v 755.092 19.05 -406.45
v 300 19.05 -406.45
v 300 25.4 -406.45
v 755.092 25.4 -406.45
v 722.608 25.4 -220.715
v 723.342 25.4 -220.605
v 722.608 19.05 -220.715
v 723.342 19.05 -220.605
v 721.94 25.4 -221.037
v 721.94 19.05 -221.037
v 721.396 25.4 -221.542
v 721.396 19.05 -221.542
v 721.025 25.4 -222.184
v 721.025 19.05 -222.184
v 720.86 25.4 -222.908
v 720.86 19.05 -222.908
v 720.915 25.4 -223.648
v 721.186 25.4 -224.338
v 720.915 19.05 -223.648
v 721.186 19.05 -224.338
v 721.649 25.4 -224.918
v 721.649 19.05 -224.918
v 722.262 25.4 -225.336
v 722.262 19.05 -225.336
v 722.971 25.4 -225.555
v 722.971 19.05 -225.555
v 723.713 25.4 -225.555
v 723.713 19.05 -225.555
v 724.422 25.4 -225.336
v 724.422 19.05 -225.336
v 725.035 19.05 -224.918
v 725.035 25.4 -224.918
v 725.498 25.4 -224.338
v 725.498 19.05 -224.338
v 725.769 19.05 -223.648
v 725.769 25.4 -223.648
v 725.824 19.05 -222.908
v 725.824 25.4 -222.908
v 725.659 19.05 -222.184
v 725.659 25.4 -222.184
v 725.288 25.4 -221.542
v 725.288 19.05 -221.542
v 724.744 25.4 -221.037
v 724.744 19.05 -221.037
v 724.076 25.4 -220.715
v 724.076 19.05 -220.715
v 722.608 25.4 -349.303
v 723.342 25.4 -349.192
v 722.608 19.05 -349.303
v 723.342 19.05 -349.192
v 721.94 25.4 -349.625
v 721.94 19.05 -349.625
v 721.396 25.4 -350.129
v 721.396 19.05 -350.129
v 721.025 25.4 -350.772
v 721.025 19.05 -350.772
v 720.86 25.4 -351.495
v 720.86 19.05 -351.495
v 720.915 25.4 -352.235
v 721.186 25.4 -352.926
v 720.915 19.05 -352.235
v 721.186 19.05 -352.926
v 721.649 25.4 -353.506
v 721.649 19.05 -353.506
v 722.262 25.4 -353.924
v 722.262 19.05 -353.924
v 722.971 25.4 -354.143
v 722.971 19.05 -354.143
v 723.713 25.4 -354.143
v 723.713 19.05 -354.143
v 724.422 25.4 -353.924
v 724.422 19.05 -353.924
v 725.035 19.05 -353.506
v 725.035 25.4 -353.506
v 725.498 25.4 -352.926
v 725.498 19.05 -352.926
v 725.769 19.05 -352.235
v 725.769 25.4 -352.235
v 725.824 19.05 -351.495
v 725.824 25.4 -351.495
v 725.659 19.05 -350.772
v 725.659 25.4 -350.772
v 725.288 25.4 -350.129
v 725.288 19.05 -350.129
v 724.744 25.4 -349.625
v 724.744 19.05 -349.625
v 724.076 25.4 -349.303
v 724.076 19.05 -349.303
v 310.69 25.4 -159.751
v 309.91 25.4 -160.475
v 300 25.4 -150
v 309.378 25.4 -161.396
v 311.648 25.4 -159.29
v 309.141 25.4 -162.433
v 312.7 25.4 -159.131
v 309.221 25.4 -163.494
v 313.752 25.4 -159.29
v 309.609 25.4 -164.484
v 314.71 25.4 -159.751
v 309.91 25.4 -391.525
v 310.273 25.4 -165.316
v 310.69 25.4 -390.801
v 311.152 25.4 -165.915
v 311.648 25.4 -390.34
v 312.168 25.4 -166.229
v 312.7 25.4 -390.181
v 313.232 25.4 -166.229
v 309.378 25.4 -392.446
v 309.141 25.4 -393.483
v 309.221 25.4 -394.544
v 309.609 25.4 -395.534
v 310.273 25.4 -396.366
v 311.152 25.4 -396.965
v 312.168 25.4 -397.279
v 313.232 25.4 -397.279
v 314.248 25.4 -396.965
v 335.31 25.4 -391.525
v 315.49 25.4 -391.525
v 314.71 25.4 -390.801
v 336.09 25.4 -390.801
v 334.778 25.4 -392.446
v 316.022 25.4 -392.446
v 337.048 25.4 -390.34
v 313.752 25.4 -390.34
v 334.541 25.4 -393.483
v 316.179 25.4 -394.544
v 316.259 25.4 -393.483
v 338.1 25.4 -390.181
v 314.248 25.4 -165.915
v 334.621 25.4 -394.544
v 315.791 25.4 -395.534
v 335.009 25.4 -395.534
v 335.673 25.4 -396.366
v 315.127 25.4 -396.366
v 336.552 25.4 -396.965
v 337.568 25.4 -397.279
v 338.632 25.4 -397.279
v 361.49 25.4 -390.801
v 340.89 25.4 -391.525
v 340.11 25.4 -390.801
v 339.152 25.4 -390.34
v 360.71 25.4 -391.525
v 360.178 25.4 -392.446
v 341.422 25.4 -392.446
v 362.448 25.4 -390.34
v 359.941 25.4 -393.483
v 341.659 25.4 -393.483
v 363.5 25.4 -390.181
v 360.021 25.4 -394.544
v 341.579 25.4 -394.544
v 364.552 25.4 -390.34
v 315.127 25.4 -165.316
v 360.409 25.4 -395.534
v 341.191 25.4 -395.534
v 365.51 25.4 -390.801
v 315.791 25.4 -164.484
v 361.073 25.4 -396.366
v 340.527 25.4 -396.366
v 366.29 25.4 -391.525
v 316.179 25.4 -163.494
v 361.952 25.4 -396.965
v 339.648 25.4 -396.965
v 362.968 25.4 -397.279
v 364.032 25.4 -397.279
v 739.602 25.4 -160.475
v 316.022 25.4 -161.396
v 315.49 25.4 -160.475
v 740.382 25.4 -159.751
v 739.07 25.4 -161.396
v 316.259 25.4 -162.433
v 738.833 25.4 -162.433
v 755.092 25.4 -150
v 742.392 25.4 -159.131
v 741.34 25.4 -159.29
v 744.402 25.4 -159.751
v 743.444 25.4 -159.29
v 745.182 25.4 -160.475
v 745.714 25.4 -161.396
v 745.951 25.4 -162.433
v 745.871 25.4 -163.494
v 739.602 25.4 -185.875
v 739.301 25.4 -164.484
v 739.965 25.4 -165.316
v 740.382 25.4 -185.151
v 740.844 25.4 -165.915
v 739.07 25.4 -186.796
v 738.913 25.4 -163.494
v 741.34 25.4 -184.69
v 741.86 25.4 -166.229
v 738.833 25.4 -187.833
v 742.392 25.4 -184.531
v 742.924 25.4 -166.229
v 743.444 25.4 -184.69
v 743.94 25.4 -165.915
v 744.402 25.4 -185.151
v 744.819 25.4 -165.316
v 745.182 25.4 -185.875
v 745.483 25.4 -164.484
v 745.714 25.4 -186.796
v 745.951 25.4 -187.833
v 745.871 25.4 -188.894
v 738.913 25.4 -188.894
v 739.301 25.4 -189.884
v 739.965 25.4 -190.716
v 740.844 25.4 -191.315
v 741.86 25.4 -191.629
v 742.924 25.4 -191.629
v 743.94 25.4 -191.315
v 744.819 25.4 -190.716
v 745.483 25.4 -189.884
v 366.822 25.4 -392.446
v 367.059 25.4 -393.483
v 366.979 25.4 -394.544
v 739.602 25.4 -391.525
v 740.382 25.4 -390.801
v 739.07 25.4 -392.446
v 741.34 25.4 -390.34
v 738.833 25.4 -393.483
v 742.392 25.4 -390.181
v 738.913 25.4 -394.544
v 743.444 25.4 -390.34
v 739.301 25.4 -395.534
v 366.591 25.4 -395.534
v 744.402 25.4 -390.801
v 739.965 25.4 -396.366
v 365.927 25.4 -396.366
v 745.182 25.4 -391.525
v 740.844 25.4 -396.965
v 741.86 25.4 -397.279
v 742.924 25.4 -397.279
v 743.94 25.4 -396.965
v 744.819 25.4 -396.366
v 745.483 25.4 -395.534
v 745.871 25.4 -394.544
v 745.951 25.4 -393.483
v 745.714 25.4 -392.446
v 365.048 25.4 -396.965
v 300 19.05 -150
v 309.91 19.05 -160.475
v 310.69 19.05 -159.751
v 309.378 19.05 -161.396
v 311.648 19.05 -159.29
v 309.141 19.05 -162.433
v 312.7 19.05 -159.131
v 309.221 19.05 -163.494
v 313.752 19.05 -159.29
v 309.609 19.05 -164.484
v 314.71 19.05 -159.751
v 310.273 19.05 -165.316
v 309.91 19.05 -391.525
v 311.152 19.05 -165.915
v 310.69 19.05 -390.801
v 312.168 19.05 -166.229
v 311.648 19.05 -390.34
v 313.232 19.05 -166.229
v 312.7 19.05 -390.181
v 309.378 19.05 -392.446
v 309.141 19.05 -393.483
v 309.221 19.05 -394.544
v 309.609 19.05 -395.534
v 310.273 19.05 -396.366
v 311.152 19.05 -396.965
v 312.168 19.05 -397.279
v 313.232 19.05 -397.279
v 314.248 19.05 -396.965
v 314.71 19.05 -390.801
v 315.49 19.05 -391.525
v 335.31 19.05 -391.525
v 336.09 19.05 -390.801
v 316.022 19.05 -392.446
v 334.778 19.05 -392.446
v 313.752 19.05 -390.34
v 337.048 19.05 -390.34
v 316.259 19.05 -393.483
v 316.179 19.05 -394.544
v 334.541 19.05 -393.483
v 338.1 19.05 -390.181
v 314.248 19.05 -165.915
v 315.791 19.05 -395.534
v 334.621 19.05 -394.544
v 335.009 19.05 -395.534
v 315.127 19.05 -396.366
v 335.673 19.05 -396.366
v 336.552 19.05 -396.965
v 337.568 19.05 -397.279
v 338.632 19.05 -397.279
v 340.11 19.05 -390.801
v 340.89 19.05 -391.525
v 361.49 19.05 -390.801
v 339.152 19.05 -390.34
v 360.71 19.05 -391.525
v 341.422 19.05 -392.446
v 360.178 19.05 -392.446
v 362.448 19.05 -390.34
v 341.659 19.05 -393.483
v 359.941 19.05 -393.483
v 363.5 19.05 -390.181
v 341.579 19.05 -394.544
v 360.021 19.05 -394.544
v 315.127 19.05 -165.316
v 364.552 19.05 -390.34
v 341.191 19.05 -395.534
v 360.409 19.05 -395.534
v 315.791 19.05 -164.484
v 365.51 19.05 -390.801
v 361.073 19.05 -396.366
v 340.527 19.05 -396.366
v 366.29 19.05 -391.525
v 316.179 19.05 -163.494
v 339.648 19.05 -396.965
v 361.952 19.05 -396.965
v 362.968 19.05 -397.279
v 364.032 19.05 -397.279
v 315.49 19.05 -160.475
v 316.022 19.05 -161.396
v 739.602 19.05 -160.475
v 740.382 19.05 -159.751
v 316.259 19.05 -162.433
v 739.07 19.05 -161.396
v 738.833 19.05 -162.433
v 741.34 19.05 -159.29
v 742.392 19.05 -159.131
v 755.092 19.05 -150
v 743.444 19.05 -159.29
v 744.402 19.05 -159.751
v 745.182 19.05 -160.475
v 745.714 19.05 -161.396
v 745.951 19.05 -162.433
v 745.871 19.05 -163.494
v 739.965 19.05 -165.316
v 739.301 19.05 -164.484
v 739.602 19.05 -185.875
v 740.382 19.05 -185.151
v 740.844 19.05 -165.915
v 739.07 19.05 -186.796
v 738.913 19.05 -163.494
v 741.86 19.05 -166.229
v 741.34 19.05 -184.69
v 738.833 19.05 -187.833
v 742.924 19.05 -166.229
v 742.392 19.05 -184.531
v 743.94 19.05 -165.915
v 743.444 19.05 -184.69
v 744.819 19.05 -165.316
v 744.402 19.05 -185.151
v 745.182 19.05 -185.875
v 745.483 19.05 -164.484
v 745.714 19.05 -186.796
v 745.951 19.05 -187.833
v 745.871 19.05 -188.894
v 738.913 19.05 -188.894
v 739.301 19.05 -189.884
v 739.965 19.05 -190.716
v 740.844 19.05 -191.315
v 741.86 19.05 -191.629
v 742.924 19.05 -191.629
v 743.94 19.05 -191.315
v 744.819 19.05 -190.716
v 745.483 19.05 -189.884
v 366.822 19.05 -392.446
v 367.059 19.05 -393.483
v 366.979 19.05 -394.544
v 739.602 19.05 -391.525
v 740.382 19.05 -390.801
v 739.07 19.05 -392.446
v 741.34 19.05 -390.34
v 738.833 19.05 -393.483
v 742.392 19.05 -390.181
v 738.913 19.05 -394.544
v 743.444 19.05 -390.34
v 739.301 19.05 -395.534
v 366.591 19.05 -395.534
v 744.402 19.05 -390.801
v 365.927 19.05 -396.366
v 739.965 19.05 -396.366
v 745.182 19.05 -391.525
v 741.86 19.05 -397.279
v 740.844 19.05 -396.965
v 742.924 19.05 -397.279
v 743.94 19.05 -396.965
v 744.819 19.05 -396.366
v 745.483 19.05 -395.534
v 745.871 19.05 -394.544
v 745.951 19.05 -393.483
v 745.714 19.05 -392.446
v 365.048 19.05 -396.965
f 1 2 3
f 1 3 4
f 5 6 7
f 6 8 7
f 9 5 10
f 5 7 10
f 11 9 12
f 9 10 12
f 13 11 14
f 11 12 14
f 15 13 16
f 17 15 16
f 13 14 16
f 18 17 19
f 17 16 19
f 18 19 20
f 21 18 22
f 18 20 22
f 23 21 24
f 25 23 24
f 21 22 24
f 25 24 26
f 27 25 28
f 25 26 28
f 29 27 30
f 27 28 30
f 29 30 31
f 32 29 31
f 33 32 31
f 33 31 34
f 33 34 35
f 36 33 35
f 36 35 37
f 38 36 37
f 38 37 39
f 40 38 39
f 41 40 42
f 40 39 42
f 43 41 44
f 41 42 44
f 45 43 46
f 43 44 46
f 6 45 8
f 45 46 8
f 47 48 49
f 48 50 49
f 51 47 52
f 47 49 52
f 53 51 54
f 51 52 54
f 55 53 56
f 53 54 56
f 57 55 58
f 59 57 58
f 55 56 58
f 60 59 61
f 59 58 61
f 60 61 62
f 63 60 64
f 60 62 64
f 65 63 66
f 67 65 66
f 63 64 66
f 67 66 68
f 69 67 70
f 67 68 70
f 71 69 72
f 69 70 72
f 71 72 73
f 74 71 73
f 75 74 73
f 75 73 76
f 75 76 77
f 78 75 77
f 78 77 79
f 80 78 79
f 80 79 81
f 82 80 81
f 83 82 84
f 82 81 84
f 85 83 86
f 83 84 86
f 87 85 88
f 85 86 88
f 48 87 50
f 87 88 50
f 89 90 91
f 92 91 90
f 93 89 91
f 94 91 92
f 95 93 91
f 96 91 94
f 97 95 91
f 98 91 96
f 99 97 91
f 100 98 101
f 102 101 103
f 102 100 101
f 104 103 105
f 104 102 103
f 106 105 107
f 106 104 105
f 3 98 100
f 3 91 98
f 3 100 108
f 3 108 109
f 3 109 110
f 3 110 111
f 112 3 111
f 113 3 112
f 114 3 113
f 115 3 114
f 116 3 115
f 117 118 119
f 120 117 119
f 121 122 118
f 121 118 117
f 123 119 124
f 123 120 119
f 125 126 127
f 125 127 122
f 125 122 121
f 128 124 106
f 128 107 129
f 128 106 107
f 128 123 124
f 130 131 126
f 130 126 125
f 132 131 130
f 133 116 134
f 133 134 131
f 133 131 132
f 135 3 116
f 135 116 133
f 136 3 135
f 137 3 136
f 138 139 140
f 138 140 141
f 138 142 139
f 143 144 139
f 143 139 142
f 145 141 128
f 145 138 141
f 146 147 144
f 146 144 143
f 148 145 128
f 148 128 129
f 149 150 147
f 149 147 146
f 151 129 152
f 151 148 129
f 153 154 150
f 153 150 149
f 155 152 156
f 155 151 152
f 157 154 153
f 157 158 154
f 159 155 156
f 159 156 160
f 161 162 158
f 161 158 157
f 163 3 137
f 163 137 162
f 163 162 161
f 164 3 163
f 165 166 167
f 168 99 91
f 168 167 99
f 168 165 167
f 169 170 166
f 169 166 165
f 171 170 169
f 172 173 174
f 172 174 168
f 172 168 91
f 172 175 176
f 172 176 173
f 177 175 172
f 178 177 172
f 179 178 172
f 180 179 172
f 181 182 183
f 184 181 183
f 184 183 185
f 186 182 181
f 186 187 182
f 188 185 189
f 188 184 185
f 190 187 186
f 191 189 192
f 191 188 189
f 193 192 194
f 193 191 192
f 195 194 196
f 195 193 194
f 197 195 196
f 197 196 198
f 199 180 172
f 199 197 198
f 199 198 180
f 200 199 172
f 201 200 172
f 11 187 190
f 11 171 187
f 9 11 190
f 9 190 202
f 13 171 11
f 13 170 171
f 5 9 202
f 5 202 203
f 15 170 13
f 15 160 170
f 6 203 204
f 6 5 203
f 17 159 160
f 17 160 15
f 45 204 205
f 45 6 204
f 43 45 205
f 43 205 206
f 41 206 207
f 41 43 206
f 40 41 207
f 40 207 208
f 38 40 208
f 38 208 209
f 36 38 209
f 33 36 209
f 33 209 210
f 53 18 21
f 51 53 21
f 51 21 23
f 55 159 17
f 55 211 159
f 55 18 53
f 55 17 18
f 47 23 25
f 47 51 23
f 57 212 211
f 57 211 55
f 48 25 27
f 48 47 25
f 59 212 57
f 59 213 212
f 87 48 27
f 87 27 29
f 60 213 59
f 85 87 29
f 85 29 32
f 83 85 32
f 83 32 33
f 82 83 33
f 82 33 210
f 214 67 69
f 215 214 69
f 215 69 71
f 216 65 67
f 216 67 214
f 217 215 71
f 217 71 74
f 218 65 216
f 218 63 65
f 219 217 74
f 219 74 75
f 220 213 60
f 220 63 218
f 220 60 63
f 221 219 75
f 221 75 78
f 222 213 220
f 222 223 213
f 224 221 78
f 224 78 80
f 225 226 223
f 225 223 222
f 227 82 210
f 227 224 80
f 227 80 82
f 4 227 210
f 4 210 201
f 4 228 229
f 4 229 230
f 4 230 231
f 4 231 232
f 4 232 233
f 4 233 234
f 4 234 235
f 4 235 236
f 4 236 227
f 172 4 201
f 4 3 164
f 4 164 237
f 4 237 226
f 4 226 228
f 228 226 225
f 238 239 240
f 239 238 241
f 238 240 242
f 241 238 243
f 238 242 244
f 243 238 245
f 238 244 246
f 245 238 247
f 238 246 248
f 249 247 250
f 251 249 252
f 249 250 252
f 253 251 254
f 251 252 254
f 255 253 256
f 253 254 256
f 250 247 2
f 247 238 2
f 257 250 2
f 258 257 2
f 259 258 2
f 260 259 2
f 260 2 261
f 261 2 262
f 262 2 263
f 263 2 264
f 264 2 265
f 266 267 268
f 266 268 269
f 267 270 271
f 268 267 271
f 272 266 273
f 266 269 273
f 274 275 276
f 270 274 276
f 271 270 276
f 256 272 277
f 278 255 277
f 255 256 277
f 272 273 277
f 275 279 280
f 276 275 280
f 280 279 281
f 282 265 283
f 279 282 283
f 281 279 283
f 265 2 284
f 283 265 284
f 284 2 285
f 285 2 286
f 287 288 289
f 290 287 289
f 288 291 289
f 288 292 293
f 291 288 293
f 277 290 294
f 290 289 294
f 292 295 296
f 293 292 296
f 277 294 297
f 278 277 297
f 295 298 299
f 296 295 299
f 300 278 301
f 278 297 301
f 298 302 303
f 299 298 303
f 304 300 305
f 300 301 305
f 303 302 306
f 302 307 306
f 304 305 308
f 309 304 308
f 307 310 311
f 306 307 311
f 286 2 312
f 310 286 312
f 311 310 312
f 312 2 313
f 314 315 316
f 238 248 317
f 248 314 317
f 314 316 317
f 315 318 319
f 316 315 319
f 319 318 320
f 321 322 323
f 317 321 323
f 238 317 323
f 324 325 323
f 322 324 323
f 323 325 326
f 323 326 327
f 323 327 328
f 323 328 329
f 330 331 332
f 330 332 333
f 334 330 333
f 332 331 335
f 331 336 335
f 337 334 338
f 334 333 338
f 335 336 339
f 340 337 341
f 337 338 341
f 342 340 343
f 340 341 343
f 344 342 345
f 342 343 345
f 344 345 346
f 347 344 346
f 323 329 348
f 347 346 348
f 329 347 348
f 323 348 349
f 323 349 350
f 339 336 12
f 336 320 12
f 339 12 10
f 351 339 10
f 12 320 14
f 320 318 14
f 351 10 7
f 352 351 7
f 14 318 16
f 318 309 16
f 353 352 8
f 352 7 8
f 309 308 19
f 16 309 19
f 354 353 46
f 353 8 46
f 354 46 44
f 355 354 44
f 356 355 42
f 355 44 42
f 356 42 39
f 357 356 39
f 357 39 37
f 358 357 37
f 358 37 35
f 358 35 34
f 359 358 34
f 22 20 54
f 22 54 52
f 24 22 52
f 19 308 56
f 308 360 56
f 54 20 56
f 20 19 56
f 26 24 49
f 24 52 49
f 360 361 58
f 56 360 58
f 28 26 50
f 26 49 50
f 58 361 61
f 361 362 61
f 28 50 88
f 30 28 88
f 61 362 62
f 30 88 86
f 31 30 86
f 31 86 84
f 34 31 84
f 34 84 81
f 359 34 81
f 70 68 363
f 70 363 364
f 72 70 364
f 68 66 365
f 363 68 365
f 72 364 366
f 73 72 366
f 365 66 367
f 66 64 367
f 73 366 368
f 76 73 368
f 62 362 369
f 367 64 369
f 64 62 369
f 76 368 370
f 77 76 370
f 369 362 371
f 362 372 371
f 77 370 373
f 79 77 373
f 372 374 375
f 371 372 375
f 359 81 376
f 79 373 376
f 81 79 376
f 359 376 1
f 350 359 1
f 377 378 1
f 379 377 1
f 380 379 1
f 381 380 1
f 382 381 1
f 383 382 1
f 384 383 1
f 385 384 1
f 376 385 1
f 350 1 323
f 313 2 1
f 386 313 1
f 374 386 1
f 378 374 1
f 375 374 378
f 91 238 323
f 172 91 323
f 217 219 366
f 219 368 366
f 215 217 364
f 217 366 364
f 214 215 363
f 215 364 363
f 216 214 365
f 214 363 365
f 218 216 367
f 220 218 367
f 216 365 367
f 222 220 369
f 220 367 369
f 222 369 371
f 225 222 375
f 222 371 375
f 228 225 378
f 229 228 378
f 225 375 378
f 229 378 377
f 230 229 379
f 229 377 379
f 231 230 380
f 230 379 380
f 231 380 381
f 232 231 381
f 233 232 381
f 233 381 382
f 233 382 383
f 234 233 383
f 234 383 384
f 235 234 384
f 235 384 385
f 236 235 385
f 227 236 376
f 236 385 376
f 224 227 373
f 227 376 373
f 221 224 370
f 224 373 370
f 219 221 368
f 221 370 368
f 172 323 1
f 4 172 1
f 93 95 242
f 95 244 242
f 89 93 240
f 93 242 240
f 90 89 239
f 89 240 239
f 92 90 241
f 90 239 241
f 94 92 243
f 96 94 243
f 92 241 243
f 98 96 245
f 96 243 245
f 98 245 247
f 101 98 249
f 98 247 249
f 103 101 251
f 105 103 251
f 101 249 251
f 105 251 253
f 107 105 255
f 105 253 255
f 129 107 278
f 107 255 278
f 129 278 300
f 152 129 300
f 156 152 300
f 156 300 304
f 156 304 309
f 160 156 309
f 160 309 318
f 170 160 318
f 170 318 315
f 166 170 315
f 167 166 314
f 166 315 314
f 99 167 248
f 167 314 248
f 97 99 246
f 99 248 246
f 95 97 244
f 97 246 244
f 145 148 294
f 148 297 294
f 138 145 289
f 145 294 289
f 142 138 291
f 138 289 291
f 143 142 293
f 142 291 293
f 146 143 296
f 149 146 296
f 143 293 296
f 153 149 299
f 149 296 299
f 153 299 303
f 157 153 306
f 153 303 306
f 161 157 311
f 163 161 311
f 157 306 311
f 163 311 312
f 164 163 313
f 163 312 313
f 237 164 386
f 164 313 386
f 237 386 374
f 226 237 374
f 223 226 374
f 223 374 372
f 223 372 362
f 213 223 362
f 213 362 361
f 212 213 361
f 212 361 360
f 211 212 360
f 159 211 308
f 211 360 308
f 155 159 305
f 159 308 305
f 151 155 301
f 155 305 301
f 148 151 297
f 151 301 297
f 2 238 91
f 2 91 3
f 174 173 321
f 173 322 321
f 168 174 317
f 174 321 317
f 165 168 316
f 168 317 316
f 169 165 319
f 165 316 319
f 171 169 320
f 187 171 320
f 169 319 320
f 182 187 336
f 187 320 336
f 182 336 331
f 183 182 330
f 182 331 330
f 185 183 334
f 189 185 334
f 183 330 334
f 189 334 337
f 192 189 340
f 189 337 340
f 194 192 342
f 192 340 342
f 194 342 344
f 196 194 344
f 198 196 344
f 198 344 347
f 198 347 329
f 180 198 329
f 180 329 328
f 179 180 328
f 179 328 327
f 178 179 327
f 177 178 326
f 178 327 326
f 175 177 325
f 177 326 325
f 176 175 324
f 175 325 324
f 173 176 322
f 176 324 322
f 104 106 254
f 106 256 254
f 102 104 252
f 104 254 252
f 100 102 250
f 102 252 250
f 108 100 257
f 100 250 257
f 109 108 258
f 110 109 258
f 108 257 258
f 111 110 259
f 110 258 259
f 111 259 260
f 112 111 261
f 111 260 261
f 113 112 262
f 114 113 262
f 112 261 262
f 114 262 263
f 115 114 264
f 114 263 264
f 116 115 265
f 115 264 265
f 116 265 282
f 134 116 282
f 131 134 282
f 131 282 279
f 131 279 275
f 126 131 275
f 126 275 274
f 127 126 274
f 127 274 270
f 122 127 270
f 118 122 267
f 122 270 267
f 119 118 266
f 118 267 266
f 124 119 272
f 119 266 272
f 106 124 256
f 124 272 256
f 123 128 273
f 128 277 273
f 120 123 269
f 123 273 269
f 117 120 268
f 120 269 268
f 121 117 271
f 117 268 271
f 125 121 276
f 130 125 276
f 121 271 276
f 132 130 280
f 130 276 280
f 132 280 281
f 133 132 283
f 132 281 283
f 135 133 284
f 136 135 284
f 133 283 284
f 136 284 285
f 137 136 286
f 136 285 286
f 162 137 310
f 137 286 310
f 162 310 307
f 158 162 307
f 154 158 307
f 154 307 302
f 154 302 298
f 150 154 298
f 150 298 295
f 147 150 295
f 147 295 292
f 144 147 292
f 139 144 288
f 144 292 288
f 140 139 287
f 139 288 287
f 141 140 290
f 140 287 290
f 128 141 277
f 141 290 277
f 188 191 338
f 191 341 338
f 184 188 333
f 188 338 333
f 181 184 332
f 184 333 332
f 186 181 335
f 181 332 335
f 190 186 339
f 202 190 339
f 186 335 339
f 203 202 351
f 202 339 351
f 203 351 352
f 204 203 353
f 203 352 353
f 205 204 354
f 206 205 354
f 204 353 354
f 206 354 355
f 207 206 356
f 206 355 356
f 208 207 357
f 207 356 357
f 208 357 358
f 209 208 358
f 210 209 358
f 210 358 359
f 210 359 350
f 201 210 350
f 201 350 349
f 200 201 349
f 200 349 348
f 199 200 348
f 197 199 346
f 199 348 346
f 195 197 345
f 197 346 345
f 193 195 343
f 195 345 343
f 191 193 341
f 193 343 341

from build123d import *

# Parameters (mm, degrees)
BOSS_EXTRUDE1_START              = 19.05
SKETCH2_W                        = 600
SKETCH2_H                        = 256.45
BOSS_EXTRUDE1_DEPTH              = 6.35
BOSS_EXTRUDE2_START              = 19.05
SKETCH2_4_W                      = 455.092
SKETCH2_4_H                      = 256.45
BOSS_EXTRUDE2_DEPTH              = 6.35
BOSS_EXTRUDE3_START              = 19.05
SKETCH2_5_W                      = 455.092
SKETCH2_5_H                      = 300
BOSS_EXTRUDE3_DEPTH              = 6.35
SKETCH8_W                        = 3.5687
SKETCH8_H                        = 6.35
F_1_4_CLEARANCE_HOLE2_AT_2_COUNT = 2
F_1_4_CLEARANCE_HOLE2_AT_2_PITCH = 231.05
F_1_4_CLEARANCE_HOLE2_AT_3_COUNT = 2
F_1_4_CLEARANCE_HOLE2_AT_3_PITCH = 595.822744195
F_1_4_CLEARANCE_HOLE2_AT_4_COUNT = 2
F_1_4_CLEARANCE_HOLE2_AT_4_PITCH = 619.31354135
F_1_4_CLEARANCE_HOLE2_AT_5_COUNT = 2
F_1_4_CLEARANCE_HOLE2_AT_5_PITCH = 523.8
F_1_4_CLEARANCE_HOLE2_AT_6_COUNT = 2
F_1_4_CLEARANCE_HOLE2_AT_6_PITCH = 549.2
F_1_4_CLEARANCE_HOLE2_AT_7_COUNT = 2
F_1_4_CLEARANCE_HOLE2_AT_7_PITCH = 574.6
SKETCH10_W                       = 3.5687
SKETCH10_H                       = 6.35
F_1_4_CLEARANCE_HOLE3_AT_2_COUNT = 2
F_1_4_CLEARANCE_HOLE3_AT_2_PITCH = 25.4
F_1_4_CLEARANCE_HOLE3_AT_3_COUNT = 2
F_1_4_CLEARANCE_HOLE3_AT_3_PITCH = 50.8
F_1_4_CLEARANCE_HOLE3_AT_4_COUNT = 2
F_1_4_CLEARANCE_HOLE3_AT_4_PITCH = 231.05
F_1_4_CLEARANCE_HOLE3_AT_5_COUNT = 2
F_1_4_CLEARANCE_HOLE3_AT_5_PITCH = 487.872234672
F_1_4_CLEARANCE_HOLE3_AT_6_COUNT = 2
F_1_4_CLEARANCE_HOLE3_AT_6_PITCH = 476.368698976
F_1_4_CLEARANCE_HOLE3_AT_7_COUNT = 2
F_1_4_CLEARANCE_HOLE3_AT_7_PITCH = 429.692
SKETCH12_W                       = 3.5687
SKETCH12_H                       = 6.35
F_1_4_CLEARANCE_HOLE4_AT_2_COUNT = 2
F_1_4_CLEARANCE_HOLE4_AT_2_PITCH = 25.4
F_1_4_CLEARANCE_HOLE4_AT_3_COUNT = 2
F_1_4_CLEARANCE_HOLE4_AT_3_PITCH = 249.2
F_1_4_CLEARANCE_HOLE4_AT_4_COUNT = 2
F_1_4_CLEARANCE_HOLE4_AT_4_PITCH = 496.725130091
F_1_4_CLEARANCE_HOLE4_AT_5_COUNT = 2
F_1_4_CLEARANCE_HOLE4_AT_5_PITCH = 429.692
F_1_4_CLEARANCE_HOLE4_AT_6_COUNT = 2
F_1_4_CLEARANCE_HOLE4_AT_6_PITCH = 430.442069115
SKETCH14_W                       = 2.4892
SKETCH14_H                       = 6.35
F_8_CLEARANCE_HOLE2_AT_2_COUNT   = 2
F_8_CLEARANCE_HOLE2_AT_2_PITCH   = 128.5875
SKETCH16_W                       = 2.4892
SKETCH16_H                       = 6.35
F_8_CLEARANCE_HOLE3_AT_2_COUNT   = 2
F_8_CLEARANCE_HOLE3_AT_2_PITCH   = 128.5875
SKETCH17_R                       = 3.5687
BOSS_EXTRUDE4_DEPTH              = 6.35
FILLET2_R                        = 6.35
SKETCH18_W                       = 152.4
SKETCH18_H                       = 25.4
SKETCH18_R                       = 3.5687
BOSS_EXTRUDE5_DEPTH              = 6.35
SKETCH19_W                       = 25.4
SKETCH19_H                       = 101.6
SKETCH19_R                       = 3.5687
BOSS_EXTRUDE6_DEPTH              = 6.35


with BuildPart() as part:
    # Sketch2 → Boss-Extrude1 (new body)
    with BuildSketch(Plane(origin=(0, 0, 0), x_dir=(1, 0, 0), z_dir=(0, 1, 0)).offset(BOSS_EXTRUDE1_START)):
        with Locations((0, 278.225)):
            Rectangle(SKETCH2_W, SKETCH2_H)
    extrude(amount=BOSS_EXTRUDE1_DEPTH)

    # Sketch8 → 1/4 Clearance Hole2 (revolve, cut)
    with BuildSketch(Plane(origin=(-287.3, 25.4, -393.75), x_dir=(0, 0, 1), z_dir=(1, 0, 0))):
        with Locations((1.78435, 3.175)):
            Rectangle(SKETCH8_W, SKETCH8_H)
    f_1_4_clearance_hole2 = revolve(axis=Axis((-287.3, 31.75, -393.75), (0, -1, 0)), mode=Mode.SUBTRACT)

    # 1/4 Clearance Hole2 at 2: 1/4 Clearance Hole2 ×2
    with Locations(*[(0, 0, i * F_1_4_CLEARANCE_HOLE2_AT_2_PITCH) for i in range(1, F_1_4_CLEARANCE_HOLE2_AT_2_COUNT)]):
        add(f_1_4_clearance_hole2, mode=Mode.SUBTRACT)

    # 1/4 Clearance Hole2 at 3: 1/4 Clearance Hole2 ×2
    with Locations(*[Vector(0.9217506470687957, 0, 0.3877831154501913) * (i * F_1_4_CLEARANCE_HOLE2_AT_3_PITCH) for i in range(1, F_1_4_CLEARANCE_HOLE2_AT_3_COUNT)]):
        add(f_1_4_clearance_hole2, mode=Mode.SUBTRACT)

    # 1/4 Clearance Hole2 at 4: 1/4 Clearance Hole2 ×2
    with Locations(*[Vector(0.9278014473041833, 0, 0.37307435502894426) * (i * F_1_4_CLEARANCE_HOLE2_AT_4_PITCH) for i in range(1, F_1_4_CLEARANCE_HOLE2_AT_4_COUNT)]):
        add(f_1_4_clearance_hole2, mode=Mode.SUBTRACT)

    # 1/4 Clearance Hole2 at 5: 1/4 Clearance Hole2 ×2
    with Locations(*[(i * F_1_4_CLEARANCE_HOLE2_AT_5_PITCH, 0, 0) for i in range(1, F_1_4_CLEARANCE_HOLE2_AT_5_COUNT)]):
        add(f_1_4_clearance_hole2, mode=Mode.SUBTRACT)

    # 1/4 Clearance Hole2 at 6: 1/4 Clearance Hole2 ×2
    with Locations(*[(i * F_1_4_CLEARANCE_HOLE2_AT_6_PITCH, 0, 0) for i in range(1, F_1_4_CLEARANCE_HOLE2_AT_6_COUNT)]):
        add(f_1_4_clearance_hole2, mode=Mode.SUBTRACT)

    # 1/4 Clearance Hole2 at 7: 1/4 Clearance Hole2 ×2
    with Locations(*[(i * F_1_4_CLEARANCE_HOLE2_AT_7_PITCH, 0, 0) for i in range(1, F_1_4_CLEARANCE_HOLE2_AT_7_COUNT)]):
        add(f_1_4_clearance_hole2, mode=Mode.SUBTRACT)

    # Sketch14 → #8 Clearance Hole2 (revolve, cut)
    with BuildSketch(Plane(origin=(-268.25, 25.4, -351.68125), x_dir=(0, 0, 1), z_dir=(1, 0, 0))):
        with Locations((1.2446, 3.175)):
            Rectangle(SKETCH14_W, SKETCH14_H)
    f_8_clearance_hole2 = revolve(axis=Axis((-268.25, 31.75, -351.68125), (0, -1, 0)), mode=Mode.SUBTRACT)

    # #8 Clearance Hole2 at 2: #8 Clearance Hole2 ×2
    with Locations(*[(0, 0, i * F_8_CLEARANCE_HOLE2_AT_2_PITCH) for i in range(1, F_8_CLEARANCE_HOLE2_AT_2_COUNT)]):
        add(f_8_clearance_hole2, mode=Mode.SUBTRACT)


with BuildPart() as body_2:
    # Sketch2<4> → Boss-Extrude2 (new body)
    with BuildSketch(Plane(origin=(0, 0, 0), x_dir=(1, 0, 0), z_dir=(0, 1, 0)).offset(BOSS_EXTRUDE2_START)):
        with Locations((527.546, 278.225)):
            Rectangle(SKETCH2_4_W, SKETCH2_4_H)
    extrude(amount=BOSS_EXTRUDE2_DEPTH)

    # Sketch10 → 1/4 Clearance Hole3 (revolve, cut)
    with BuildSketch(Plane(origin=(312.7, 25.4, -393.75), x_dir=(0, 0, 1), z_dir=(1, 0, 0))):
        with Locations((1.78435, 3.175)):
            Rectangle(SKETCH10_W, SKETCH10_H)
    f_1_4_clearance_hole3 = revolve(axis=Axis((312.7, 31.75, -393.75), (0, -1, 0)), mode=Mode.SUBTRACT)

    # 1/4 Clearance Hole3 at 2: 1/4 Clearance Hole3 ×2
    with Locations(*[(i * F_1_4_CLEARANCE_HOLE3_AT_2_PITCH, 0, 0) for i in range(1, F_1_4_CLEARANCE_HOLE3_AT_2_COUNT)]):
        add(f_1_4_clearance_hole3, mode=Mode.SUBTRACT)

    # 1/4 Clearance Hole3 at 3: 1/4 Clearance Hole3 ×2
    with Locations(*[(i * F_1_4_CLEARANCE_HOLE3_AT_3_PITCH, 0, 0) for i in range(1, F_1_4_CLEARANCE_HOLE3_AT_3_COUNT)]):
        add(f_1_4_clearance_hole3, mode=Mode.SUBTRACT)

    # 1/4 Clearance Hole3 at 4: 1/4 Clearance Hole3 ×2
    with Locations(*[(0, 0, i * F_1_4_CLEARANCE_HOLE3_AT_4_PITCH) for i in range(1, F_1_4_CLEARANCE_HOLE3_AT_4_COUNT)]):
        add(f_1_4_clearance_hole3, mode=Mode.SUBTRACT)

    # 1/4 Clearance Hole3 at 5: 1/4 Clearance Hole3 ×2
    with Locations(*[Vector(0.880746985506873, 0, 0.47358710658183684) * (i * F_1_4_CLEARANCE_HOLE3_AT_5_PITCH) for i in range(1, F_1_4_CLEARANCE_HOLE3_AT_5_COUNT)]):
        add(f_1_4_clearance_hole3, mode=Mode.SUBTRACT)

    # 1/4 Clearance Hole3 at 6: 1/4 Clearance Hole3 ×2
    with Locations(*[Vector(0.9020156045595491, 0, 0.4317034272866863) * (i * F_1_4_CLEARANCE_HOLE3_AT_6_PITCH) for i in range(1, F_1_4_CLEARANCE_HOLE3_AT_6_COUNT)]):
        add(f_1_4_clearance_hole3, mode=Mode.SUBTRACT)

    # 1/4 Clearance Hole3 at 7: 1/4 Clearance Hole3 ×2
    with Locations(*[(i * F_1_4_CLEARANCE_HOLE3_AT_7_PITCH, 0, 0) for i in range(1, F_1_4_CLEARANCE_HOLE3_AT_7_COUNT)]):
        add(f_1_4_clearance_hole3, mode=Mode.SUBTRACT)

    # Sketch16 → #8 Clearance Hole3 (revolve, cut)
    with BuildSketch(Plane(origin=(723.342, 25.4, -351.68125), x_dir=(0, 0, 1), z_dir=(1, 0, 0))):
        with Locations((1.2446, 3.175)):
            Rectangle(SKETCH16_W, SKETCH16_H)
    f_8_clearance_hole3 = revolve(axis=Axis((723.342, 31.75, -351.68125), (0, -1, 0)), mode=Mode.SUBTRACT)

    # #8 Clearance Hole3 at 2: #8 Clearance Hole3 ×2
    with Locations(*[(0, 0, i * F_8_CLEARANCE_HOLE3_AT_2_PITCH) for i in range(1, F_8_CLEARANCE_HOLE3_AT_2_COUNT)]):
        add(f_8_clearance_hole3, mode=Mode.SUBTRACT)


with BuildPart() as body_3:
    # Sketch2<5> → Boss-Extrude3 (new body)
    with BuildSketch(Plane(origin=(0, 0, 0), x_dir=(1, 0, 0), z_dir=(0, 1, 0)).offset(BOSS_EXTRUDE3_START)):
        with Locations((527.546, 0)):
            Rectangle(SKETCH2_5_W, SKETCH2_5_H)
    extrude(amount=BOSS_EXTRUDE3_DEPTH)

    # Sketch12 → 1/4 Clearance Hole4 (revolve, cut)
    with BuildSketch(Plane(origin=(312.7, 25.4, -111.9), x_dir=(0, 0, 1), z_dir=(1, 0, 0))):
        with Locations((1.78435, 3.175)):
            Rectangle(SKETCH12_W, SKETCH12_H)
    f_1_4_clearance_hole4 = revolve(axis=Axis((312.7, 31.75, -111.9), (0, -1, 0)), mode=Mode.SUBTRACT)

    # 1/4 Clearance Hole4 at 2: 1/4 Clearance Hole4 ×2
    with Locations(*[(0, 0, -i * F_1_4_CLEARANCE_HOLE4_AT_2_PITCH) for i in range(1, F_1_4_CLEARANCE_HOLE4_AT_2_COUNT)]):
        add(f_1_4_clearance_hole4, mode=Mode.SUBTRACT)

    # 1/4 Clearance Hole4 at 3: 1/4 Clearance Hole4 ×2
    with Locations(*[(0, 0, i * F_1_4_CLEARANCE_HOLE4_AT_3_PITCH) for i in range(1, F_1_4_CLEARANCE_HOLE4_AT_3_COUNT)]):
        add(f_1_4_clearance_hole4, mode=Mode.SUBTRACT)

    # 1/4 Clearance Hole4 at 4: 1/4 Clearance Hole4 ×2
    with Locations(*[Vector(0.865049851456502, 0, 0.5016859121951541) * (i * F_1_4_CLEARANCE_HOLE4_AT_4_PITCH) for i in range(1, F_1_4_CLEARANCE_HOLE4_AT_4_COUNT)]):
        add(f_1_4_clearance_hole4, mode=Mode.SUBTRACT)

    # 1/4 Clearance Hole4 at 5: 1/4 Clearance Hole4 ×2
    with Locations(*[(i * F_1_4_CLEARANCE_HOLE4_AT_5_PITCH, 0, 0) for i in range(1, F_1_4_CLEARANCE_HOLE4_AT_5_COUNT)]):
        add(f_1_4_clearance_hole4, mode=Mode.SUBTRACT)

    # 1/4 Clearance Hole4 at 6: 1/4 Clearance Hole4 ×2
    with Locations(*[Vector(0.998257444685787, 0, -0.05900910208944768) * (i * F_1_4_CLEARANCE_HOLE4_AT_6_PITCH) for i in range(1, F_1_4_CLEARANCE_HOLE4_AT_6_COUNT)]):
        add(f_1_4_clearance_hole4, mode=Mode.SUBTRACT)


with BuildPart() as body_4:
    # Sketch17 → Boss-Extrude4 (new body)
    with BuildSketch(Plane(origin=(0, 25.4, 0), x_dir=(1, 0, 0), z_dir=(0, 1, 0))):
        Polygon((249.2, 150), (249.2, 175.4), (325.4, 175.4), (325.4, 99.2), (300, 99.2), (300, 150), align=None)
        with Locations(Location((261.9, 162.7, 0), (0, 0, 270))):
            Circle(SKETCH17_R, mode=Mode.SUBTRACT)
        with Locations(Location((287.3, 162.7, 0), (0, 0, 270))):
            Circle(SKETCH17_R, mode=Mode.SUBTRACT)
        with Locations(Location((312.7, 162.7, 0), (0, 0, 270))):
            Circle(SKETCH17_R, mode=Mode.SUBTRACT)
        with Locations(Location((312.7, 137.3, 0), (0, 0, 270))):
            Circle(SKETCH17_R, mode=Mode.SUBTRACT)
        with Locations(Location((312.7, 111.9, 0), (0, 0, 270))):
            Circle(SKETCH17_R, mode=Mode.SUBTRACT)
    extrude(amount=BOSS_EXTRUDE4_DEPTH)

    # Fillet2
    fillet2_edges = [body_4.edges().sort_by_distance(p)[0] for p in [
        (249.2, 28.575, -150),
        (249.2, 28.575, -175.4),
        (325.4, 28.575, -175.4),
        (325.4, 28.575, -99.2),
        (300, 28.575, -99.2),
    ]]
    fillet(fillet2_edges, radius=FILLET2_R)


with BuildPart() as body_5:
    # Sketch18 → Boss-Extrude5 (new body)
    with BuildSketch(Plane(origin=(0, 25.4, 0), x_dir=(1, 0, 0), z_dir=(0, 1, 0))):
        with Locations((300, 393.75)):
            Rectangle(SKETCH18_W, SKETCH18_H)
        with Locations(Location((236.5, 393.75, 0), (0, 0, 270))):
            Circle(SKETCH18_R, mode=Mode.SUBTRACT)
        with Locations(Location((261.9, 393.75, 0), (0, 0, 270))):
            Circle(SKETCH18_R, mode=Mode.SUBTRACT)
        with Locations(Location((287.3, 393.75, 0), (0, 0, 270))):
            Circle(SKETCH18_R, mode=Mode.SUBTRACT)
        with Locations(Location((312.7, 393.75, 0), (0, 0, 270))):
            Circle(SKETCH18_R, mode=Mode.SUBTRACT)
        with Locations(Location((338.1, 393.75, 0), (0, 0, 270))):
            Circle(SKETCH18_R, mode=Mode.SUBTRACT)
        with Locations(Location((363.5, 393.75, 0), (0, 0, 270))):
            Circle(SKETCH18_R, mode=Mode.SUBTRACT)
    extrude(amount=BOSS_EXTRUDE5_DEPTH)


with BuildPart() as body_6:
    # Sketch19 → Boss-Extrude6 (new body)
    with BuildSketch(Plane(origin=(0, 25.4, 0), x_dir=(1, 0, 0), z_dir=(0, 1, 0))):
        with Locations((742.392, 150)):
            Rectangle(SKETCH19_W, SKETCH19_H)
        with Locations((742.392, 111.9)):
            Circle(SKETCH19_R, mode=Mode.SUBTRACT)
        with Locations((742.392, 137.3)):
            Circle(SKETCH19_R, mode=Mode.SUBTRACT)
        with Locations(Location((742.392, 162.7, 0), (0, 0, 270))):
            Circle(SKETCH19_R, mode=Mode.SUBTRACT)
        with Locations(Location((742.392, 188.1, 0), (0, 0, 270))):
            Circle(SKETCH19_R, mode=Mode.SUBTRACT)
    extrude(amount=BOSS_EXTRUDE6_DEPTH)


solid = body_2.part
